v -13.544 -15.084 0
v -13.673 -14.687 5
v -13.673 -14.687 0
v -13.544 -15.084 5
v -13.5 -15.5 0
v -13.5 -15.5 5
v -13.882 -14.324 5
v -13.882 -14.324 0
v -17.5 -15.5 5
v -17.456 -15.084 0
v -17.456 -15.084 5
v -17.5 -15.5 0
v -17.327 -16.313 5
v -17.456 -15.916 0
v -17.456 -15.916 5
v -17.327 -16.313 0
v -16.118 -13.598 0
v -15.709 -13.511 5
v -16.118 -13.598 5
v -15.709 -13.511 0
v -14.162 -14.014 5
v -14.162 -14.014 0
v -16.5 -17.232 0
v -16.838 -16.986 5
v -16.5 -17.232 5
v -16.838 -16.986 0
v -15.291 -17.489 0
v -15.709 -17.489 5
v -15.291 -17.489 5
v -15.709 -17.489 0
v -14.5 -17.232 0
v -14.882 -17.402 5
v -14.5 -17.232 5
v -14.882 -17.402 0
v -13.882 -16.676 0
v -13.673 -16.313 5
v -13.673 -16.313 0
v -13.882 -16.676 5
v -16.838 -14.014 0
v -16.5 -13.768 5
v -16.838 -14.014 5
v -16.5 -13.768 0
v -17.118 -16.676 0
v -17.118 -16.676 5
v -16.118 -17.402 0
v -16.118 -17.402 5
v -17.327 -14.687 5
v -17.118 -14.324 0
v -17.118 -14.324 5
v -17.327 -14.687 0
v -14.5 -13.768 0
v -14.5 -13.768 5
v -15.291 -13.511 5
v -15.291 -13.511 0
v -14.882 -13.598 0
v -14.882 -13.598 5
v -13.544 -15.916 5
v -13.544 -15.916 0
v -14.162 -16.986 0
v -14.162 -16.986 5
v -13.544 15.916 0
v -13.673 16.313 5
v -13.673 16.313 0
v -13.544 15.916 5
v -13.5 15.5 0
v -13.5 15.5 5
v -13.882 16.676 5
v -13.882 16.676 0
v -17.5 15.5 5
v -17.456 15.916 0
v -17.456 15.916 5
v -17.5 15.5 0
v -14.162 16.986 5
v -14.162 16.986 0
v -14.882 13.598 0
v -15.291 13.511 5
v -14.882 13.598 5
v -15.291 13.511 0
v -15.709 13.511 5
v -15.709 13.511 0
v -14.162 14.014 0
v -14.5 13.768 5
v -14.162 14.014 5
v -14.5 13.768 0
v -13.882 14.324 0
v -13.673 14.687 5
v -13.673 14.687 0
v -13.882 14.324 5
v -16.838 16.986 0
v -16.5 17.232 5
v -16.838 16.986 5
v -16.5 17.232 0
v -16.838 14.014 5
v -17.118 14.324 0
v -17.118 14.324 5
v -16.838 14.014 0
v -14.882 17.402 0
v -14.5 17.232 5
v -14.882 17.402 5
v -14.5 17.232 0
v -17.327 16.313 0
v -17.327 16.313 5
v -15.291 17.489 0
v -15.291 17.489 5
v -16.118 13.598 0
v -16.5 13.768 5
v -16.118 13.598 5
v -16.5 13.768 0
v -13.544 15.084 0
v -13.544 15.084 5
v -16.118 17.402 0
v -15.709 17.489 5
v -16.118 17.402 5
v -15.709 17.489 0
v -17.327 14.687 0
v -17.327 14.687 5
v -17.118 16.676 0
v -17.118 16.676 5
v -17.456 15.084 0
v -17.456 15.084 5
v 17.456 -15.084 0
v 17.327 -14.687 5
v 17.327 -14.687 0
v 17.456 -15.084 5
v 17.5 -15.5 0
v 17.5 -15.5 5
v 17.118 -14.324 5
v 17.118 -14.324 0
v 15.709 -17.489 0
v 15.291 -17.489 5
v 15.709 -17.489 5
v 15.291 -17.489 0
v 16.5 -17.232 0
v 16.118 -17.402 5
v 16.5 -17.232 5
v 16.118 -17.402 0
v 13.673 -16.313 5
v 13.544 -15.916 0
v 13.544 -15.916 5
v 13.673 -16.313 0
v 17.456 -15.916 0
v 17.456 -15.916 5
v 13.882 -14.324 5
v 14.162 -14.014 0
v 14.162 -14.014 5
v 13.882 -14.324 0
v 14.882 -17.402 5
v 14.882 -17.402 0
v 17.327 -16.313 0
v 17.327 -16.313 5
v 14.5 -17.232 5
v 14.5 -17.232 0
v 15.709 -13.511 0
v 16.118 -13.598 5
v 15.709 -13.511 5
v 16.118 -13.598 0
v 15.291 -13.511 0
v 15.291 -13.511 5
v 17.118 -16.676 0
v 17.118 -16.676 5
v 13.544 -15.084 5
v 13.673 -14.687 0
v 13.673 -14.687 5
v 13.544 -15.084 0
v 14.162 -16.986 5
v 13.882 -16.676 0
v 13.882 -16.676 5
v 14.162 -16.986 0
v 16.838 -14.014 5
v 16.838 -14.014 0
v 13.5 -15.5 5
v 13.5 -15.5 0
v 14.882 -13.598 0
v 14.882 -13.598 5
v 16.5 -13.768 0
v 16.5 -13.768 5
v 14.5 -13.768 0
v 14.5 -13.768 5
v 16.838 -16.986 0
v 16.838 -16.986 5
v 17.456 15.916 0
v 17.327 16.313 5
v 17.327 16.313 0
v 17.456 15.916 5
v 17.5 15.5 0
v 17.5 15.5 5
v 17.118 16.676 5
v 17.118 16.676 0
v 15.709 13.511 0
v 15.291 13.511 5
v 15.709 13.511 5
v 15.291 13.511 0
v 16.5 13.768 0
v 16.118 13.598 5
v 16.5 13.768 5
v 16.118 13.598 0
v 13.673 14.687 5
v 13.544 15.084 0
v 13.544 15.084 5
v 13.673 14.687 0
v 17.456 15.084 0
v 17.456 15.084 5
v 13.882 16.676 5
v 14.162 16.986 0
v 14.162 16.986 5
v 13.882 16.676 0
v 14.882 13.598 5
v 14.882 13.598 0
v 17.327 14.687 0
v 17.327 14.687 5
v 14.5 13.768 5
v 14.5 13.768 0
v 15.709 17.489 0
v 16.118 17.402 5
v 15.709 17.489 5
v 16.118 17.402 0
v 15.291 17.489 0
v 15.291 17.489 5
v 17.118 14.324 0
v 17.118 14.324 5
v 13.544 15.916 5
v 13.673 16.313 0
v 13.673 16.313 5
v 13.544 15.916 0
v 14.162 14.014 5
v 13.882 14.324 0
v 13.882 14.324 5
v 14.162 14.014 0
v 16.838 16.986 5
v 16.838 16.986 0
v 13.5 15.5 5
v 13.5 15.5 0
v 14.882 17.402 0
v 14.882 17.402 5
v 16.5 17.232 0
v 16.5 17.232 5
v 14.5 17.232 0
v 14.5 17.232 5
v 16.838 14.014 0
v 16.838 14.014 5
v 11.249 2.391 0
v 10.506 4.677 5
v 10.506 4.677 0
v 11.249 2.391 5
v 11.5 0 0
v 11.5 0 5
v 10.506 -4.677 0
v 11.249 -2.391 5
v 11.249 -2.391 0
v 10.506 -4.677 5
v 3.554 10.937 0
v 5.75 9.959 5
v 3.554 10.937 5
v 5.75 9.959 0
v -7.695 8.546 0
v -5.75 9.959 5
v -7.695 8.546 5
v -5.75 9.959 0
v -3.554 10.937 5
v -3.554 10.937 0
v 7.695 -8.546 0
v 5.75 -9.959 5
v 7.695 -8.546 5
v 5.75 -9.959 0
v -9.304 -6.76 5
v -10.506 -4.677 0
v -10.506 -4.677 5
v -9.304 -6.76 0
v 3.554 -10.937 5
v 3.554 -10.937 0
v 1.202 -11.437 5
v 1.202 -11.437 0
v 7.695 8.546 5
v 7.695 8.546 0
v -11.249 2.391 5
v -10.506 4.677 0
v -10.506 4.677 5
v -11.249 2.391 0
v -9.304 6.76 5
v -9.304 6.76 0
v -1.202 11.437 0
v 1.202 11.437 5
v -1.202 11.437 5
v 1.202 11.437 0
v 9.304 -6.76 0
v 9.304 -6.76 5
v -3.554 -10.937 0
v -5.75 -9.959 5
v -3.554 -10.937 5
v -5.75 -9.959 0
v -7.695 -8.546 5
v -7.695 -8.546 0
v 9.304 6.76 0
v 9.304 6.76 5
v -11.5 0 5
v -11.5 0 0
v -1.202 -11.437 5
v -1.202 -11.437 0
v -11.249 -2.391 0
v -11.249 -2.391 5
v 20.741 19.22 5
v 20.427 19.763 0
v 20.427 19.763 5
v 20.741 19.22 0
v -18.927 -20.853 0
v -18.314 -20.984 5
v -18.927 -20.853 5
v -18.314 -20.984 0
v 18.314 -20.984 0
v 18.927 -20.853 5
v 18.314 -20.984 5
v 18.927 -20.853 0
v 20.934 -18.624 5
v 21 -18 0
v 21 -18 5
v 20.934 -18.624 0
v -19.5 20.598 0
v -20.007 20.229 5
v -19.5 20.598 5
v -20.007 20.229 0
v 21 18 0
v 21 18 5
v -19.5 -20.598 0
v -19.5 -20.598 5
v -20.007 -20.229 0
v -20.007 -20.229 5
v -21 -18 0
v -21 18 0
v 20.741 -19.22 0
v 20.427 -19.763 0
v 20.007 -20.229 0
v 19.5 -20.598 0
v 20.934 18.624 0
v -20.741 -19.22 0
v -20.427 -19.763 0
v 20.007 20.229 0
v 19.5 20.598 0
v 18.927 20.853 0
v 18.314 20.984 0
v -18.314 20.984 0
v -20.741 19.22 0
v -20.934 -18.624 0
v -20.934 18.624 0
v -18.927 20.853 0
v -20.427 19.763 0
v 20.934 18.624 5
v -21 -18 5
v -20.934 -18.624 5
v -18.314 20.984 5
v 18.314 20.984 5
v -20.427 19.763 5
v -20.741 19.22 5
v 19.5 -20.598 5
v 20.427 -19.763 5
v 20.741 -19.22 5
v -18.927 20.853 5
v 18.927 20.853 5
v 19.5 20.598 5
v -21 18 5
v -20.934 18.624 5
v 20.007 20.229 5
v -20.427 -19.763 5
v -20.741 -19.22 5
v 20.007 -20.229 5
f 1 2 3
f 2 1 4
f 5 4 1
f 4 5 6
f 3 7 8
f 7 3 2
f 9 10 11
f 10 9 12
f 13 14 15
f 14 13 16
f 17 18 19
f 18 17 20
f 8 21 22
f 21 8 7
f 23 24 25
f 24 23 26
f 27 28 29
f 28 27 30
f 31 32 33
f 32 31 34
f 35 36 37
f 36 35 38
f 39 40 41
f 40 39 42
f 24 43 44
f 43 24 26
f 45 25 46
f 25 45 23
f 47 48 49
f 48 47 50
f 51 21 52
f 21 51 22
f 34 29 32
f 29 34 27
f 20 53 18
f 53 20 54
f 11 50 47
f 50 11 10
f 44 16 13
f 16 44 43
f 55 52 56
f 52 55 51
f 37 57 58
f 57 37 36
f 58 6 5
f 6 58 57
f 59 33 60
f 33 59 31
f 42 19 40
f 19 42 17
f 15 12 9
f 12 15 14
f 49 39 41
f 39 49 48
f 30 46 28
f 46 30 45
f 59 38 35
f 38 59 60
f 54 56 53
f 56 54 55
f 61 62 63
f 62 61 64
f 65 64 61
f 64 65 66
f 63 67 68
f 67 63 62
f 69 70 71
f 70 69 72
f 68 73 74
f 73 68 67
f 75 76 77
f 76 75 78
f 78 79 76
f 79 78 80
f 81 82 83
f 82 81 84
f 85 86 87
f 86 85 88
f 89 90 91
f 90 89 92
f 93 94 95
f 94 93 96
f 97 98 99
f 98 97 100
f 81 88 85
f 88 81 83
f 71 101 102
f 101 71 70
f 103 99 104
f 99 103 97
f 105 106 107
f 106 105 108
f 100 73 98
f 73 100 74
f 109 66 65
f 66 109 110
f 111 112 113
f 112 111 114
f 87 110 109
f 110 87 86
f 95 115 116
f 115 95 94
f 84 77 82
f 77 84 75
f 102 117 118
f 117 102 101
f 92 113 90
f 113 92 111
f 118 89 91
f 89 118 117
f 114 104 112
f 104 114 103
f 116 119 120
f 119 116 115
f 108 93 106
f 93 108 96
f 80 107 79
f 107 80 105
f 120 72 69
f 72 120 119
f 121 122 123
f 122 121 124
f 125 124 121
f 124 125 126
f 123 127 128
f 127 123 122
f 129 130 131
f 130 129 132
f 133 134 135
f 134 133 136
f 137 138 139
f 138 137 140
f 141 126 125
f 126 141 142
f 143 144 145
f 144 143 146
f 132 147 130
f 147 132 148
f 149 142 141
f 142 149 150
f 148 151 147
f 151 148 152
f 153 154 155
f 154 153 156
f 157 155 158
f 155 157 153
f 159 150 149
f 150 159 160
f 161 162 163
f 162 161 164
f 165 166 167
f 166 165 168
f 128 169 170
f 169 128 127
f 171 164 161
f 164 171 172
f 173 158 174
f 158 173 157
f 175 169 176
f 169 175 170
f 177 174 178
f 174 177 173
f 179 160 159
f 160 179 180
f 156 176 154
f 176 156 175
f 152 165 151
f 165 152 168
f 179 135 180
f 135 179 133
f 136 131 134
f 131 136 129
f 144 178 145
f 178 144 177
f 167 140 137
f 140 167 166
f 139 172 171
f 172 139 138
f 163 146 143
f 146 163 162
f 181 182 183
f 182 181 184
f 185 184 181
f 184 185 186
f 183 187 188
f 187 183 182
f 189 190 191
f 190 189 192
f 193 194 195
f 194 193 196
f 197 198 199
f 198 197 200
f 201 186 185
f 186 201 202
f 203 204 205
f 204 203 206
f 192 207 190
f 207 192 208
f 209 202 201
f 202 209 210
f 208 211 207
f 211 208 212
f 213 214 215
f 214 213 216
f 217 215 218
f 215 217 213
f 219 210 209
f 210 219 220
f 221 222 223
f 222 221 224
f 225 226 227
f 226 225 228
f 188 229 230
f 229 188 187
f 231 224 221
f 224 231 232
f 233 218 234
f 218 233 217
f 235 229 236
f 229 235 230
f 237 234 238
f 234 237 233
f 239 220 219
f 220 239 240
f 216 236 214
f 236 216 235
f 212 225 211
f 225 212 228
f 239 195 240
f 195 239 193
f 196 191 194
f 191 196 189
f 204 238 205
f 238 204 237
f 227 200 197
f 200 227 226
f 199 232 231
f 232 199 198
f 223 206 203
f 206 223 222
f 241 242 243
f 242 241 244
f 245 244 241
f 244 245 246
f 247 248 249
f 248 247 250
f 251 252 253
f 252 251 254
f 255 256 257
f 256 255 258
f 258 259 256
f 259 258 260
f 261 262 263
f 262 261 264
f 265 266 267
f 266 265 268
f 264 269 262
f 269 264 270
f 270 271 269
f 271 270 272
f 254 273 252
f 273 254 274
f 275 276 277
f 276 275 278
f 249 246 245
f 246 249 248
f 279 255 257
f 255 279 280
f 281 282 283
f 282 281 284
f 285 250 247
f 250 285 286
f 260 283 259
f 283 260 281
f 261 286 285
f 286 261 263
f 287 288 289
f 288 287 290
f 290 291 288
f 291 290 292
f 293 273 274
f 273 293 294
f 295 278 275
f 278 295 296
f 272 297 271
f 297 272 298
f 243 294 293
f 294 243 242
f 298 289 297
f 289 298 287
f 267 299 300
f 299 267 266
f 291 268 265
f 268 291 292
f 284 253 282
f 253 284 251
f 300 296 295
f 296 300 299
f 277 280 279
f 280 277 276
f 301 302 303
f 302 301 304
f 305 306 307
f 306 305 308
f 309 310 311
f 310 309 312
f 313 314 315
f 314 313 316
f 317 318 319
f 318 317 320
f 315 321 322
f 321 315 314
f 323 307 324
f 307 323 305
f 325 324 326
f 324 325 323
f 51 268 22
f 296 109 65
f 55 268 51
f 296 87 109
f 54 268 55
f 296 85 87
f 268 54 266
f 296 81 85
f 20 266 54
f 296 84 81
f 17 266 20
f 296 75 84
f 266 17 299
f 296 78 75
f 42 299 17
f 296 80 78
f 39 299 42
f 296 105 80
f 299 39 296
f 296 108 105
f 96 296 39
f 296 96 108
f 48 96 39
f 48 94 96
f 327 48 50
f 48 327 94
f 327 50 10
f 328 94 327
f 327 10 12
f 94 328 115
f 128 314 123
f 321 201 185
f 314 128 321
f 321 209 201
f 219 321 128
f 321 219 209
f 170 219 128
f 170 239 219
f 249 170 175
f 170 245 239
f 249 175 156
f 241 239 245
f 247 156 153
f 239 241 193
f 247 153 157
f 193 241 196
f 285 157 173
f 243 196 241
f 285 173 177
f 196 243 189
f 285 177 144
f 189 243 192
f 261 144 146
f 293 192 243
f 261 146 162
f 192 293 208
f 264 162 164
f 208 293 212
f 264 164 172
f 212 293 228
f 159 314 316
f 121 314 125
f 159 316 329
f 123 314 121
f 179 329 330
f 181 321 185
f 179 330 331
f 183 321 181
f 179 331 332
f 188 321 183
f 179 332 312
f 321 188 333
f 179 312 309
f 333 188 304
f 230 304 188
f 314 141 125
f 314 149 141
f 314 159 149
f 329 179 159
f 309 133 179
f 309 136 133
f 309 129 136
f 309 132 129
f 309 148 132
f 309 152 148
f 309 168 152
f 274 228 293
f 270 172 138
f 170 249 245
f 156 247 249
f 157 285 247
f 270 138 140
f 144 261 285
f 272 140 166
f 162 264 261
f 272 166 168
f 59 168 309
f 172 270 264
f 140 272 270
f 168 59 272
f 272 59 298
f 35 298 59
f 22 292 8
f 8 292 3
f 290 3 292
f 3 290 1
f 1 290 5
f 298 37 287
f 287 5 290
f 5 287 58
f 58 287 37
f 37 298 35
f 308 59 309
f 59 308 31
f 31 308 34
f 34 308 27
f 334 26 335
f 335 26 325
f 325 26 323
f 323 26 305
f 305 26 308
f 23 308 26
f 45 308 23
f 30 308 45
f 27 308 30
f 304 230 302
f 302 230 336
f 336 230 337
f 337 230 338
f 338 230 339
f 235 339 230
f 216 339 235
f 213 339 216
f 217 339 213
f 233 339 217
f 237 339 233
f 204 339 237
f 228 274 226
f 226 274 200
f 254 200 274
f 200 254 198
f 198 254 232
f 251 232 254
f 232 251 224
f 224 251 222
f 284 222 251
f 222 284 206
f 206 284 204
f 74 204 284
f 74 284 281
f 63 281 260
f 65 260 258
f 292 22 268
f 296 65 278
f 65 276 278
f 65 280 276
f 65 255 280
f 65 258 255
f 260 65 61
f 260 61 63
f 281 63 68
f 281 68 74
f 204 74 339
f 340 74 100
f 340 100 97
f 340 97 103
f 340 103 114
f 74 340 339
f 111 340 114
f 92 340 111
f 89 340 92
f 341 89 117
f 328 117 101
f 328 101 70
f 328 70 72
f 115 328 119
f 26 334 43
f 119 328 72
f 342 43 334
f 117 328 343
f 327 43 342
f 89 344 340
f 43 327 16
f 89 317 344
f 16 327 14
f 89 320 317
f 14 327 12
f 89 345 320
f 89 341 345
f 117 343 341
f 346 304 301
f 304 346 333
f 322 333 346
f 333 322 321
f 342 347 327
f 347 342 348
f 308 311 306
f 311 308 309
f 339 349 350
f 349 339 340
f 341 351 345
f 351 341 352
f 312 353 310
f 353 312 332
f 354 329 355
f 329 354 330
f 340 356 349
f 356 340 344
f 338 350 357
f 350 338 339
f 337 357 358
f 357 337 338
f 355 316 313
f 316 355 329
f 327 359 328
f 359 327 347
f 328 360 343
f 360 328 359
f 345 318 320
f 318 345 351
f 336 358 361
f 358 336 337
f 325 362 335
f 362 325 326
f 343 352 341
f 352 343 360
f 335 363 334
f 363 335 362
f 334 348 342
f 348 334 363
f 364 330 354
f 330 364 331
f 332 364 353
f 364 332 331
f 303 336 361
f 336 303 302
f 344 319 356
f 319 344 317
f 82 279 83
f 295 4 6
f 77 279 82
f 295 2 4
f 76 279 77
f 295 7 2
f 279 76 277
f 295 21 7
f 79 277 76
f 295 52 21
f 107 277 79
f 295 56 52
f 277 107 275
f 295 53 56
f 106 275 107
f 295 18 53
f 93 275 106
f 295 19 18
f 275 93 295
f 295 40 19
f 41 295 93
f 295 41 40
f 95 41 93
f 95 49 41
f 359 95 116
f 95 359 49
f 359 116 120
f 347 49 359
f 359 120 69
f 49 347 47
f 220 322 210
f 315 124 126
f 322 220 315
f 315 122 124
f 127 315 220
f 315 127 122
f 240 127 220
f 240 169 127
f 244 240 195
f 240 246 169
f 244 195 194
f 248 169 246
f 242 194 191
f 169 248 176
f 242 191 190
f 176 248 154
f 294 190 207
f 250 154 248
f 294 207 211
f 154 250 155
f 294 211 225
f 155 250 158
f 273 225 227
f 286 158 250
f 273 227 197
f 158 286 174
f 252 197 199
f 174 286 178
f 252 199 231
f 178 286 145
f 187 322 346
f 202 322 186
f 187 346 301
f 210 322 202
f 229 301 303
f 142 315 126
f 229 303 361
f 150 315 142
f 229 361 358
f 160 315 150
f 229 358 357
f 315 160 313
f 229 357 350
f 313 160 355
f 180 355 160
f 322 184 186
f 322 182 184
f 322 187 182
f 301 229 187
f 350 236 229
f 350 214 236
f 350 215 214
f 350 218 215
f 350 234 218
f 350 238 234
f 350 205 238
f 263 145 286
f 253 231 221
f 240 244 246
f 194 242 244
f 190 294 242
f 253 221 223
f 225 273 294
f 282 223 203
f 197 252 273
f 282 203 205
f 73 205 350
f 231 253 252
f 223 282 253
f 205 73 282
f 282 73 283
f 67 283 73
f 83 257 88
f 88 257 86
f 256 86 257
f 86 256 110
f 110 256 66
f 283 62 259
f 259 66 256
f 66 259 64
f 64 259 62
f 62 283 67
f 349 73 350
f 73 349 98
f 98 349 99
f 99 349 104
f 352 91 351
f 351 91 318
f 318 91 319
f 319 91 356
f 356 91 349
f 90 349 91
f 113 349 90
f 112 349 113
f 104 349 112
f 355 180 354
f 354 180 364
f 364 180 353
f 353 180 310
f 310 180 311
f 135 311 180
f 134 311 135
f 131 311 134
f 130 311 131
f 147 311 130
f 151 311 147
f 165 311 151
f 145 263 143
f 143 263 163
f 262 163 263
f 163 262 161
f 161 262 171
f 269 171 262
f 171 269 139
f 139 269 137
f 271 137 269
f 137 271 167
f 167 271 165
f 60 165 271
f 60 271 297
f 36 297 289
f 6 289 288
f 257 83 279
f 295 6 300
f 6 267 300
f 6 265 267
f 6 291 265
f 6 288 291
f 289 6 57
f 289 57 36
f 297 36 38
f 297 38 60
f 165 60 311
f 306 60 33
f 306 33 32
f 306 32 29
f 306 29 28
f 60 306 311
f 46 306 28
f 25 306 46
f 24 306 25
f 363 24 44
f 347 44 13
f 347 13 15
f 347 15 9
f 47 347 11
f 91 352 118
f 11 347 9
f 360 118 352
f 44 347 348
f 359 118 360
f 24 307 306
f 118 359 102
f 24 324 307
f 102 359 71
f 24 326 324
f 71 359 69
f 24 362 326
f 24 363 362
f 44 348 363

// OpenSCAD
x_width = 42;
y_width = 42;
rounding = 3;
thickness = 5;

// A plate fitting a nema17 motor. 
// x_width and y_width must be > motor_width
module nema_17_mount(x_width = 42, y_width = 42, rounding = 0, thickness=5)
{
  motor_width = 42;
  bolt = 4;

	$fs = 0.1;
	
  difference()
  {
    // plate
    if (rounding != 0) {
      x_offset = x_width/2-rounding;
      y_offset = y_width/2-rounding;
      hull() {
        for (x = [-x_offset, x_offset]) {
          for (y = [-y_offset, y_offset]) {
            translate([x, y, 0]) 
              cylinder(r=rounding, h=thickness);
          }
        }
      }
    } else {
      translate([0,0,thickness/2])
        cube([x_width, y_width, thickness], center=true); 
    }
    
    //nema 17 mount
    translate([0,0,-1])
    union() {
      // bolt holes
      for (x = [-15.5, 15.5]) {
        for (y = [-15.5, 15.5]) {
          translate([x, y, 0])
            cylinder(r=bolt/2, h=thickness+2);
        }
      }
      // shaft cover hole
      cylinder(r=11.5, h=thickness+2);
    }
  }
}

nema_17_mount(x_width, y_width, rounding, thickness);
